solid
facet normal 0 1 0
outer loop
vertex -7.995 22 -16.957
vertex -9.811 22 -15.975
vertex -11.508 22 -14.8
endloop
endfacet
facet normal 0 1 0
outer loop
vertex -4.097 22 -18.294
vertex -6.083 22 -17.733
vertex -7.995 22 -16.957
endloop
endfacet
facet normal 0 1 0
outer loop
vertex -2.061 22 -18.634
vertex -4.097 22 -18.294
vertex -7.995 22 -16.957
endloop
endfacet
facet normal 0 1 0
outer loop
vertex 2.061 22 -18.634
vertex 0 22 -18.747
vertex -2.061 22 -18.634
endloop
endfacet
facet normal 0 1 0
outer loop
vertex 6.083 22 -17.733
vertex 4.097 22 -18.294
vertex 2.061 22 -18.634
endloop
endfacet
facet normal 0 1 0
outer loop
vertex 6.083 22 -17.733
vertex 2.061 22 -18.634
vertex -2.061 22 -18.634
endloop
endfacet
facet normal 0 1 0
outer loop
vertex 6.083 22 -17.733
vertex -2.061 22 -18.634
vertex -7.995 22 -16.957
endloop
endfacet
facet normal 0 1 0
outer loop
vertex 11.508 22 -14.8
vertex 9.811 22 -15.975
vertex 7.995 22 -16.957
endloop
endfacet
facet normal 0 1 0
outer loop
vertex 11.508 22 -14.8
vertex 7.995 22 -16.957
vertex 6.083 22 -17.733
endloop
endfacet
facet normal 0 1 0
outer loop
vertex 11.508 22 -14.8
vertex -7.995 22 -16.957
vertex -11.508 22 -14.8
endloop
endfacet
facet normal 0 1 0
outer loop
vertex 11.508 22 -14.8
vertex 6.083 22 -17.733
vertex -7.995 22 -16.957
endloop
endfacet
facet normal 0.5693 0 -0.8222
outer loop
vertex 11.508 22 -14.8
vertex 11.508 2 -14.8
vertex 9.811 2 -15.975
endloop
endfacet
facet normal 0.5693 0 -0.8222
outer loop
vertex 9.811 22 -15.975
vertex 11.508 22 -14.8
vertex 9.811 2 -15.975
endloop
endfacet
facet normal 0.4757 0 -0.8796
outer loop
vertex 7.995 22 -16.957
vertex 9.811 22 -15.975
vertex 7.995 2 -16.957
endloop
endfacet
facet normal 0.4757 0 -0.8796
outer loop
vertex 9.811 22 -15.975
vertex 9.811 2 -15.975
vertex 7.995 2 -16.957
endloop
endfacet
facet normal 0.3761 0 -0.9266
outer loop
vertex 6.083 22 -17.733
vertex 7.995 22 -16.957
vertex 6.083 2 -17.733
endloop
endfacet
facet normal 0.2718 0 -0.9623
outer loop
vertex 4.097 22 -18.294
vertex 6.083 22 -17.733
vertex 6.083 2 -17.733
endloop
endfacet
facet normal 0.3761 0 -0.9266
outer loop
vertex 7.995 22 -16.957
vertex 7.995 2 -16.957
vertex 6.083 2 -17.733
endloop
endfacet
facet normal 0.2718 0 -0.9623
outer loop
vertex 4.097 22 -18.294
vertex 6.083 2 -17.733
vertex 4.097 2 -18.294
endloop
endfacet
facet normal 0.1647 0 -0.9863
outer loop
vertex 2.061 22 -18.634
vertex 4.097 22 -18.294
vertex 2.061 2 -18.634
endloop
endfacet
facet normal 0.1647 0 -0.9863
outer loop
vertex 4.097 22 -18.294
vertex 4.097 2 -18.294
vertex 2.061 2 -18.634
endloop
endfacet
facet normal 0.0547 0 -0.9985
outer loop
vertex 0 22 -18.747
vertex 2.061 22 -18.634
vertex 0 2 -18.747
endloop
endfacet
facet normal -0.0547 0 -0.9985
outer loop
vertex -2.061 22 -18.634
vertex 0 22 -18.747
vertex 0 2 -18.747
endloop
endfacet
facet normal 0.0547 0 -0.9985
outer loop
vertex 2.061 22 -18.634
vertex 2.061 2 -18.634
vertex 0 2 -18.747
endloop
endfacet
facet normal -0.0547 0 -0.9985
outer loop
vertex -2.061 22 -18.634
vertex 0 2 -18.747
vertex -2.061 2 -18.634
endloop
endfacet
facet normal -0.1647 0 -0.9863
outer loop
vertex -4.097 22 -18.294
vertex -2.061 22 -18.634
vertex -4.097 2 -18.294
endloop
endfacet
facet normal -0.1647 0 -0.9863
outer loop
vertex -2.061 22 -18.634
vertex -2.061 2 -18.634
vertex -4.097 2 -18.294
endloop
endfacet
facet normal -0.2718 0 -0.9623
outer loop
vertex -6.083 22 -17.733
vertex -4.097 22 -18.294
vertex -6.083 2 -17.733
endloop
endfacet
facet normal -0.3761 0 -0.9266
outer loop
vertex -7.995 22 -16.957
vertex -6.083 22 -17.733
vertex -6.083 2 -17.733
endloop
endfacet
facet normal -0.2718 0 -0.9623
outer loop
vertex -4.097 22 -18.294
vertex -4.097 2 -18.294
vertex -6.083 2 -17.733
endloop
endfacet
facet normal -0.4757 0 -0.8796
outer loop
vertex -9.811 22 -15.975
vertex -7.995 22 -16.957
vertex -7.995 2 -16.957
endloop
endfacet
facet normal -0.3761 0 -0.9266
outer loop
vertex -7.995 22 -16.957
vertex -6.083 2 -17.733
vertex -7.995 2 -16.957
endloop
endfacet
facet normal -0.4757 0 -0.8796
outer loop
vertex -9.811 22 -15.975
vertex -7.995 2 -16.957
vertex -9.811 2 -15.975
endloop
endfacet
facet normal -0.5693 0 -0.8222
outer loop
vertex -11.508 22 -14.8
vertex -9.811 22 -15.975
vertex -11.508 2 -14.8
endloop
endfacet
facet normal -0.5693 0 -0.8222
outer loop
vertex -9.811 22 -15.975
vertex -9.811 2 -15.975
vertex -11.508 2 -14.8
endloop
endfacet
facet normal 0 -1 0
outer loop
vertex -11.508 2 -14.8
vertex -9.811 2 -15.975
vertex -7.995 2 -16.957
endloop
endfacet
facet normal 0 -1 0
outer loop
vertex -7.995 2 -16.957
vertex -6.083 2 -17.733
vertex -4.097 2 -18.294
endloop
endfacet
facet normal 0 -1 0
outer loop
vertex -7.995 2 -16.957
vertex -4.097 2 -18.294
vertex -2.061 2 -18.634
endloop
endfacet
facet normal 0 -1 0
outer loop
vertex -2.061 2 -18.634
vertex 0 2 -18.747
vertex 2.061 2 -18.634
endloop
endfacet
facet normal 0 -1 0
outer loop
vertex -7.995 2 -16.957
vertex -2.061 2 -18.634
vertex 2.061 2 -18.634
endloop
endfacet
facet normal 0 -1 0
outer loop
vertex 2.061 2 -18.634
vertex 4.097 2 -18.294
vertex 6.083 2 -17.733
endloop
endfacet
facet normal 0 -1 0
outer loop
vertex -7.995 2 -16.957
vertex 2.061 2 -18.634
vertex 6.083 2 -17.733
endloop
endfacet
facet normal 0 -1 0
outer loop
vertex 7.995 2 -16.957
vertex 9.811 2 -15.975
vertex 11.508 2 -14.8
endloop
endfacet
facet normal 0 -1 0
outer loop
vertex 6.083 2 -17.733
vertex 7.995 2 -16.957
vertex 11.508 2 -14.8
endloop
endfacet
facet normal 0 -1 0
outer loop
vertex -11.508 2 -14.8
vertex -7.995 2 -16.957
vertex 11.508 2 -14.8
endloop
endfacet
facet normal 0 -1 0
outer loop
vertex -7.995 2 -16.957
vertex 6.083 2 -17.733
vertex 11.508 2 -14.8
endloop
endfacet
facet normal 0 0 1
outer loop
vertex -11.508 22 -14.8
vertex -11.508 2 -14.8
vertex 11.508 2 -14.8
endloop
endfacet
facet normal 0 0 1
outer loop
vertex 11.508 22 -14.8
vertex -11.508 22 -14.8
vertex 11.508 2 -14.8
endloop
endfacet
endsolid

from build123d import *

# Parameters (mm, degrees)
SKETCH1_R               = 25.7
MAIN_CYLINDER_DEPTH     = 100
MAIN_START              = -98
MAIN_CUT_DOWN_DEPTH     = 98
BOSS_EXTRUDE1_DEPTH     = 20
CUT_EXTRUDE1_DEPTH      = 43.485056196
CUT_EXTRUDE1_DEPTH_BACK = 43.485056196
SKETCH9_W               = 59.759495022
SKETCH9_H               = 2


with BuildPart() as part:
    # Sketch1 → Main Cylinder (new body)
    with BuildSketch(Plane(origin=(0, 0, 0), x_dir=(1, 0, 0), z_dir=(0, 1, 0))):
        with Locations(Location((0, 0, 0), (0, 0, 270))):
            Circle(SKETCH1_R)
    extrude(amount=MAIN_CYLINDER_DEPTH)

    # Sketch4 → Main cut down (cut)
    with BuildSketch(Plane(origin=(0, 100, 0), x_dir=(1, 0, 0), z_dir=(0, 1, 0)).offset(MAIN_START)):
        with BuildLine():
            Line((-25.7, 0), (0, 0))
            Line((0, 0), (25.7, 0))
            ThreePointArc((25.7, 0), (0, 25.7), (-25.7, 0))
        make_face()
        with BuildLine():
            Line((25.7, 0), (0, 0))
            Line((0, 0), (-25.7, 0))
            ThreePointArc((-25.7, 0), (0, -25.7), (25.7, 0))
        make_face()
    extrude(amount=MAIN_CUT_DOWN_DEPTH, mode=Mode.SUBTRACT)

    # Sketch8 → Boss-Extrude1 (add)
    with BuildSketch(Plane(origin=(0, 2, 0), x_dir=(1, 0, 0), z_dir=(0, 1, 0))):
        with BuildLine():
            Line((-11.5075562, 14.8), (11.5075562, 14.8))
            ThreePointArc((11.5075562, 14.8), (0, 18.747369141), (-11.5075562, 14.8))
        make_face()
    extrude(amount=BOSS_EXTRUDE1_DEPTH)

    # Sketch9 → Cut-Extrude1 (cut, two sides: drawn at the far end of the back side and taken through both)
    with BuildSketch(Plane.XY.offset(-CUT_EXTRUDE1_DEPTH_BACK)):
        with Locations((-0.511377988, 1)):
            Rectangle(SKETCH9_W, SKETCH9_H)
    extrude(amount=CUT_EXTRUDE1_DEPTH + CUT_EXTRUDE1_DEPTH_BACK, mode=Mode.SUBTRACT)


solid = part.part
